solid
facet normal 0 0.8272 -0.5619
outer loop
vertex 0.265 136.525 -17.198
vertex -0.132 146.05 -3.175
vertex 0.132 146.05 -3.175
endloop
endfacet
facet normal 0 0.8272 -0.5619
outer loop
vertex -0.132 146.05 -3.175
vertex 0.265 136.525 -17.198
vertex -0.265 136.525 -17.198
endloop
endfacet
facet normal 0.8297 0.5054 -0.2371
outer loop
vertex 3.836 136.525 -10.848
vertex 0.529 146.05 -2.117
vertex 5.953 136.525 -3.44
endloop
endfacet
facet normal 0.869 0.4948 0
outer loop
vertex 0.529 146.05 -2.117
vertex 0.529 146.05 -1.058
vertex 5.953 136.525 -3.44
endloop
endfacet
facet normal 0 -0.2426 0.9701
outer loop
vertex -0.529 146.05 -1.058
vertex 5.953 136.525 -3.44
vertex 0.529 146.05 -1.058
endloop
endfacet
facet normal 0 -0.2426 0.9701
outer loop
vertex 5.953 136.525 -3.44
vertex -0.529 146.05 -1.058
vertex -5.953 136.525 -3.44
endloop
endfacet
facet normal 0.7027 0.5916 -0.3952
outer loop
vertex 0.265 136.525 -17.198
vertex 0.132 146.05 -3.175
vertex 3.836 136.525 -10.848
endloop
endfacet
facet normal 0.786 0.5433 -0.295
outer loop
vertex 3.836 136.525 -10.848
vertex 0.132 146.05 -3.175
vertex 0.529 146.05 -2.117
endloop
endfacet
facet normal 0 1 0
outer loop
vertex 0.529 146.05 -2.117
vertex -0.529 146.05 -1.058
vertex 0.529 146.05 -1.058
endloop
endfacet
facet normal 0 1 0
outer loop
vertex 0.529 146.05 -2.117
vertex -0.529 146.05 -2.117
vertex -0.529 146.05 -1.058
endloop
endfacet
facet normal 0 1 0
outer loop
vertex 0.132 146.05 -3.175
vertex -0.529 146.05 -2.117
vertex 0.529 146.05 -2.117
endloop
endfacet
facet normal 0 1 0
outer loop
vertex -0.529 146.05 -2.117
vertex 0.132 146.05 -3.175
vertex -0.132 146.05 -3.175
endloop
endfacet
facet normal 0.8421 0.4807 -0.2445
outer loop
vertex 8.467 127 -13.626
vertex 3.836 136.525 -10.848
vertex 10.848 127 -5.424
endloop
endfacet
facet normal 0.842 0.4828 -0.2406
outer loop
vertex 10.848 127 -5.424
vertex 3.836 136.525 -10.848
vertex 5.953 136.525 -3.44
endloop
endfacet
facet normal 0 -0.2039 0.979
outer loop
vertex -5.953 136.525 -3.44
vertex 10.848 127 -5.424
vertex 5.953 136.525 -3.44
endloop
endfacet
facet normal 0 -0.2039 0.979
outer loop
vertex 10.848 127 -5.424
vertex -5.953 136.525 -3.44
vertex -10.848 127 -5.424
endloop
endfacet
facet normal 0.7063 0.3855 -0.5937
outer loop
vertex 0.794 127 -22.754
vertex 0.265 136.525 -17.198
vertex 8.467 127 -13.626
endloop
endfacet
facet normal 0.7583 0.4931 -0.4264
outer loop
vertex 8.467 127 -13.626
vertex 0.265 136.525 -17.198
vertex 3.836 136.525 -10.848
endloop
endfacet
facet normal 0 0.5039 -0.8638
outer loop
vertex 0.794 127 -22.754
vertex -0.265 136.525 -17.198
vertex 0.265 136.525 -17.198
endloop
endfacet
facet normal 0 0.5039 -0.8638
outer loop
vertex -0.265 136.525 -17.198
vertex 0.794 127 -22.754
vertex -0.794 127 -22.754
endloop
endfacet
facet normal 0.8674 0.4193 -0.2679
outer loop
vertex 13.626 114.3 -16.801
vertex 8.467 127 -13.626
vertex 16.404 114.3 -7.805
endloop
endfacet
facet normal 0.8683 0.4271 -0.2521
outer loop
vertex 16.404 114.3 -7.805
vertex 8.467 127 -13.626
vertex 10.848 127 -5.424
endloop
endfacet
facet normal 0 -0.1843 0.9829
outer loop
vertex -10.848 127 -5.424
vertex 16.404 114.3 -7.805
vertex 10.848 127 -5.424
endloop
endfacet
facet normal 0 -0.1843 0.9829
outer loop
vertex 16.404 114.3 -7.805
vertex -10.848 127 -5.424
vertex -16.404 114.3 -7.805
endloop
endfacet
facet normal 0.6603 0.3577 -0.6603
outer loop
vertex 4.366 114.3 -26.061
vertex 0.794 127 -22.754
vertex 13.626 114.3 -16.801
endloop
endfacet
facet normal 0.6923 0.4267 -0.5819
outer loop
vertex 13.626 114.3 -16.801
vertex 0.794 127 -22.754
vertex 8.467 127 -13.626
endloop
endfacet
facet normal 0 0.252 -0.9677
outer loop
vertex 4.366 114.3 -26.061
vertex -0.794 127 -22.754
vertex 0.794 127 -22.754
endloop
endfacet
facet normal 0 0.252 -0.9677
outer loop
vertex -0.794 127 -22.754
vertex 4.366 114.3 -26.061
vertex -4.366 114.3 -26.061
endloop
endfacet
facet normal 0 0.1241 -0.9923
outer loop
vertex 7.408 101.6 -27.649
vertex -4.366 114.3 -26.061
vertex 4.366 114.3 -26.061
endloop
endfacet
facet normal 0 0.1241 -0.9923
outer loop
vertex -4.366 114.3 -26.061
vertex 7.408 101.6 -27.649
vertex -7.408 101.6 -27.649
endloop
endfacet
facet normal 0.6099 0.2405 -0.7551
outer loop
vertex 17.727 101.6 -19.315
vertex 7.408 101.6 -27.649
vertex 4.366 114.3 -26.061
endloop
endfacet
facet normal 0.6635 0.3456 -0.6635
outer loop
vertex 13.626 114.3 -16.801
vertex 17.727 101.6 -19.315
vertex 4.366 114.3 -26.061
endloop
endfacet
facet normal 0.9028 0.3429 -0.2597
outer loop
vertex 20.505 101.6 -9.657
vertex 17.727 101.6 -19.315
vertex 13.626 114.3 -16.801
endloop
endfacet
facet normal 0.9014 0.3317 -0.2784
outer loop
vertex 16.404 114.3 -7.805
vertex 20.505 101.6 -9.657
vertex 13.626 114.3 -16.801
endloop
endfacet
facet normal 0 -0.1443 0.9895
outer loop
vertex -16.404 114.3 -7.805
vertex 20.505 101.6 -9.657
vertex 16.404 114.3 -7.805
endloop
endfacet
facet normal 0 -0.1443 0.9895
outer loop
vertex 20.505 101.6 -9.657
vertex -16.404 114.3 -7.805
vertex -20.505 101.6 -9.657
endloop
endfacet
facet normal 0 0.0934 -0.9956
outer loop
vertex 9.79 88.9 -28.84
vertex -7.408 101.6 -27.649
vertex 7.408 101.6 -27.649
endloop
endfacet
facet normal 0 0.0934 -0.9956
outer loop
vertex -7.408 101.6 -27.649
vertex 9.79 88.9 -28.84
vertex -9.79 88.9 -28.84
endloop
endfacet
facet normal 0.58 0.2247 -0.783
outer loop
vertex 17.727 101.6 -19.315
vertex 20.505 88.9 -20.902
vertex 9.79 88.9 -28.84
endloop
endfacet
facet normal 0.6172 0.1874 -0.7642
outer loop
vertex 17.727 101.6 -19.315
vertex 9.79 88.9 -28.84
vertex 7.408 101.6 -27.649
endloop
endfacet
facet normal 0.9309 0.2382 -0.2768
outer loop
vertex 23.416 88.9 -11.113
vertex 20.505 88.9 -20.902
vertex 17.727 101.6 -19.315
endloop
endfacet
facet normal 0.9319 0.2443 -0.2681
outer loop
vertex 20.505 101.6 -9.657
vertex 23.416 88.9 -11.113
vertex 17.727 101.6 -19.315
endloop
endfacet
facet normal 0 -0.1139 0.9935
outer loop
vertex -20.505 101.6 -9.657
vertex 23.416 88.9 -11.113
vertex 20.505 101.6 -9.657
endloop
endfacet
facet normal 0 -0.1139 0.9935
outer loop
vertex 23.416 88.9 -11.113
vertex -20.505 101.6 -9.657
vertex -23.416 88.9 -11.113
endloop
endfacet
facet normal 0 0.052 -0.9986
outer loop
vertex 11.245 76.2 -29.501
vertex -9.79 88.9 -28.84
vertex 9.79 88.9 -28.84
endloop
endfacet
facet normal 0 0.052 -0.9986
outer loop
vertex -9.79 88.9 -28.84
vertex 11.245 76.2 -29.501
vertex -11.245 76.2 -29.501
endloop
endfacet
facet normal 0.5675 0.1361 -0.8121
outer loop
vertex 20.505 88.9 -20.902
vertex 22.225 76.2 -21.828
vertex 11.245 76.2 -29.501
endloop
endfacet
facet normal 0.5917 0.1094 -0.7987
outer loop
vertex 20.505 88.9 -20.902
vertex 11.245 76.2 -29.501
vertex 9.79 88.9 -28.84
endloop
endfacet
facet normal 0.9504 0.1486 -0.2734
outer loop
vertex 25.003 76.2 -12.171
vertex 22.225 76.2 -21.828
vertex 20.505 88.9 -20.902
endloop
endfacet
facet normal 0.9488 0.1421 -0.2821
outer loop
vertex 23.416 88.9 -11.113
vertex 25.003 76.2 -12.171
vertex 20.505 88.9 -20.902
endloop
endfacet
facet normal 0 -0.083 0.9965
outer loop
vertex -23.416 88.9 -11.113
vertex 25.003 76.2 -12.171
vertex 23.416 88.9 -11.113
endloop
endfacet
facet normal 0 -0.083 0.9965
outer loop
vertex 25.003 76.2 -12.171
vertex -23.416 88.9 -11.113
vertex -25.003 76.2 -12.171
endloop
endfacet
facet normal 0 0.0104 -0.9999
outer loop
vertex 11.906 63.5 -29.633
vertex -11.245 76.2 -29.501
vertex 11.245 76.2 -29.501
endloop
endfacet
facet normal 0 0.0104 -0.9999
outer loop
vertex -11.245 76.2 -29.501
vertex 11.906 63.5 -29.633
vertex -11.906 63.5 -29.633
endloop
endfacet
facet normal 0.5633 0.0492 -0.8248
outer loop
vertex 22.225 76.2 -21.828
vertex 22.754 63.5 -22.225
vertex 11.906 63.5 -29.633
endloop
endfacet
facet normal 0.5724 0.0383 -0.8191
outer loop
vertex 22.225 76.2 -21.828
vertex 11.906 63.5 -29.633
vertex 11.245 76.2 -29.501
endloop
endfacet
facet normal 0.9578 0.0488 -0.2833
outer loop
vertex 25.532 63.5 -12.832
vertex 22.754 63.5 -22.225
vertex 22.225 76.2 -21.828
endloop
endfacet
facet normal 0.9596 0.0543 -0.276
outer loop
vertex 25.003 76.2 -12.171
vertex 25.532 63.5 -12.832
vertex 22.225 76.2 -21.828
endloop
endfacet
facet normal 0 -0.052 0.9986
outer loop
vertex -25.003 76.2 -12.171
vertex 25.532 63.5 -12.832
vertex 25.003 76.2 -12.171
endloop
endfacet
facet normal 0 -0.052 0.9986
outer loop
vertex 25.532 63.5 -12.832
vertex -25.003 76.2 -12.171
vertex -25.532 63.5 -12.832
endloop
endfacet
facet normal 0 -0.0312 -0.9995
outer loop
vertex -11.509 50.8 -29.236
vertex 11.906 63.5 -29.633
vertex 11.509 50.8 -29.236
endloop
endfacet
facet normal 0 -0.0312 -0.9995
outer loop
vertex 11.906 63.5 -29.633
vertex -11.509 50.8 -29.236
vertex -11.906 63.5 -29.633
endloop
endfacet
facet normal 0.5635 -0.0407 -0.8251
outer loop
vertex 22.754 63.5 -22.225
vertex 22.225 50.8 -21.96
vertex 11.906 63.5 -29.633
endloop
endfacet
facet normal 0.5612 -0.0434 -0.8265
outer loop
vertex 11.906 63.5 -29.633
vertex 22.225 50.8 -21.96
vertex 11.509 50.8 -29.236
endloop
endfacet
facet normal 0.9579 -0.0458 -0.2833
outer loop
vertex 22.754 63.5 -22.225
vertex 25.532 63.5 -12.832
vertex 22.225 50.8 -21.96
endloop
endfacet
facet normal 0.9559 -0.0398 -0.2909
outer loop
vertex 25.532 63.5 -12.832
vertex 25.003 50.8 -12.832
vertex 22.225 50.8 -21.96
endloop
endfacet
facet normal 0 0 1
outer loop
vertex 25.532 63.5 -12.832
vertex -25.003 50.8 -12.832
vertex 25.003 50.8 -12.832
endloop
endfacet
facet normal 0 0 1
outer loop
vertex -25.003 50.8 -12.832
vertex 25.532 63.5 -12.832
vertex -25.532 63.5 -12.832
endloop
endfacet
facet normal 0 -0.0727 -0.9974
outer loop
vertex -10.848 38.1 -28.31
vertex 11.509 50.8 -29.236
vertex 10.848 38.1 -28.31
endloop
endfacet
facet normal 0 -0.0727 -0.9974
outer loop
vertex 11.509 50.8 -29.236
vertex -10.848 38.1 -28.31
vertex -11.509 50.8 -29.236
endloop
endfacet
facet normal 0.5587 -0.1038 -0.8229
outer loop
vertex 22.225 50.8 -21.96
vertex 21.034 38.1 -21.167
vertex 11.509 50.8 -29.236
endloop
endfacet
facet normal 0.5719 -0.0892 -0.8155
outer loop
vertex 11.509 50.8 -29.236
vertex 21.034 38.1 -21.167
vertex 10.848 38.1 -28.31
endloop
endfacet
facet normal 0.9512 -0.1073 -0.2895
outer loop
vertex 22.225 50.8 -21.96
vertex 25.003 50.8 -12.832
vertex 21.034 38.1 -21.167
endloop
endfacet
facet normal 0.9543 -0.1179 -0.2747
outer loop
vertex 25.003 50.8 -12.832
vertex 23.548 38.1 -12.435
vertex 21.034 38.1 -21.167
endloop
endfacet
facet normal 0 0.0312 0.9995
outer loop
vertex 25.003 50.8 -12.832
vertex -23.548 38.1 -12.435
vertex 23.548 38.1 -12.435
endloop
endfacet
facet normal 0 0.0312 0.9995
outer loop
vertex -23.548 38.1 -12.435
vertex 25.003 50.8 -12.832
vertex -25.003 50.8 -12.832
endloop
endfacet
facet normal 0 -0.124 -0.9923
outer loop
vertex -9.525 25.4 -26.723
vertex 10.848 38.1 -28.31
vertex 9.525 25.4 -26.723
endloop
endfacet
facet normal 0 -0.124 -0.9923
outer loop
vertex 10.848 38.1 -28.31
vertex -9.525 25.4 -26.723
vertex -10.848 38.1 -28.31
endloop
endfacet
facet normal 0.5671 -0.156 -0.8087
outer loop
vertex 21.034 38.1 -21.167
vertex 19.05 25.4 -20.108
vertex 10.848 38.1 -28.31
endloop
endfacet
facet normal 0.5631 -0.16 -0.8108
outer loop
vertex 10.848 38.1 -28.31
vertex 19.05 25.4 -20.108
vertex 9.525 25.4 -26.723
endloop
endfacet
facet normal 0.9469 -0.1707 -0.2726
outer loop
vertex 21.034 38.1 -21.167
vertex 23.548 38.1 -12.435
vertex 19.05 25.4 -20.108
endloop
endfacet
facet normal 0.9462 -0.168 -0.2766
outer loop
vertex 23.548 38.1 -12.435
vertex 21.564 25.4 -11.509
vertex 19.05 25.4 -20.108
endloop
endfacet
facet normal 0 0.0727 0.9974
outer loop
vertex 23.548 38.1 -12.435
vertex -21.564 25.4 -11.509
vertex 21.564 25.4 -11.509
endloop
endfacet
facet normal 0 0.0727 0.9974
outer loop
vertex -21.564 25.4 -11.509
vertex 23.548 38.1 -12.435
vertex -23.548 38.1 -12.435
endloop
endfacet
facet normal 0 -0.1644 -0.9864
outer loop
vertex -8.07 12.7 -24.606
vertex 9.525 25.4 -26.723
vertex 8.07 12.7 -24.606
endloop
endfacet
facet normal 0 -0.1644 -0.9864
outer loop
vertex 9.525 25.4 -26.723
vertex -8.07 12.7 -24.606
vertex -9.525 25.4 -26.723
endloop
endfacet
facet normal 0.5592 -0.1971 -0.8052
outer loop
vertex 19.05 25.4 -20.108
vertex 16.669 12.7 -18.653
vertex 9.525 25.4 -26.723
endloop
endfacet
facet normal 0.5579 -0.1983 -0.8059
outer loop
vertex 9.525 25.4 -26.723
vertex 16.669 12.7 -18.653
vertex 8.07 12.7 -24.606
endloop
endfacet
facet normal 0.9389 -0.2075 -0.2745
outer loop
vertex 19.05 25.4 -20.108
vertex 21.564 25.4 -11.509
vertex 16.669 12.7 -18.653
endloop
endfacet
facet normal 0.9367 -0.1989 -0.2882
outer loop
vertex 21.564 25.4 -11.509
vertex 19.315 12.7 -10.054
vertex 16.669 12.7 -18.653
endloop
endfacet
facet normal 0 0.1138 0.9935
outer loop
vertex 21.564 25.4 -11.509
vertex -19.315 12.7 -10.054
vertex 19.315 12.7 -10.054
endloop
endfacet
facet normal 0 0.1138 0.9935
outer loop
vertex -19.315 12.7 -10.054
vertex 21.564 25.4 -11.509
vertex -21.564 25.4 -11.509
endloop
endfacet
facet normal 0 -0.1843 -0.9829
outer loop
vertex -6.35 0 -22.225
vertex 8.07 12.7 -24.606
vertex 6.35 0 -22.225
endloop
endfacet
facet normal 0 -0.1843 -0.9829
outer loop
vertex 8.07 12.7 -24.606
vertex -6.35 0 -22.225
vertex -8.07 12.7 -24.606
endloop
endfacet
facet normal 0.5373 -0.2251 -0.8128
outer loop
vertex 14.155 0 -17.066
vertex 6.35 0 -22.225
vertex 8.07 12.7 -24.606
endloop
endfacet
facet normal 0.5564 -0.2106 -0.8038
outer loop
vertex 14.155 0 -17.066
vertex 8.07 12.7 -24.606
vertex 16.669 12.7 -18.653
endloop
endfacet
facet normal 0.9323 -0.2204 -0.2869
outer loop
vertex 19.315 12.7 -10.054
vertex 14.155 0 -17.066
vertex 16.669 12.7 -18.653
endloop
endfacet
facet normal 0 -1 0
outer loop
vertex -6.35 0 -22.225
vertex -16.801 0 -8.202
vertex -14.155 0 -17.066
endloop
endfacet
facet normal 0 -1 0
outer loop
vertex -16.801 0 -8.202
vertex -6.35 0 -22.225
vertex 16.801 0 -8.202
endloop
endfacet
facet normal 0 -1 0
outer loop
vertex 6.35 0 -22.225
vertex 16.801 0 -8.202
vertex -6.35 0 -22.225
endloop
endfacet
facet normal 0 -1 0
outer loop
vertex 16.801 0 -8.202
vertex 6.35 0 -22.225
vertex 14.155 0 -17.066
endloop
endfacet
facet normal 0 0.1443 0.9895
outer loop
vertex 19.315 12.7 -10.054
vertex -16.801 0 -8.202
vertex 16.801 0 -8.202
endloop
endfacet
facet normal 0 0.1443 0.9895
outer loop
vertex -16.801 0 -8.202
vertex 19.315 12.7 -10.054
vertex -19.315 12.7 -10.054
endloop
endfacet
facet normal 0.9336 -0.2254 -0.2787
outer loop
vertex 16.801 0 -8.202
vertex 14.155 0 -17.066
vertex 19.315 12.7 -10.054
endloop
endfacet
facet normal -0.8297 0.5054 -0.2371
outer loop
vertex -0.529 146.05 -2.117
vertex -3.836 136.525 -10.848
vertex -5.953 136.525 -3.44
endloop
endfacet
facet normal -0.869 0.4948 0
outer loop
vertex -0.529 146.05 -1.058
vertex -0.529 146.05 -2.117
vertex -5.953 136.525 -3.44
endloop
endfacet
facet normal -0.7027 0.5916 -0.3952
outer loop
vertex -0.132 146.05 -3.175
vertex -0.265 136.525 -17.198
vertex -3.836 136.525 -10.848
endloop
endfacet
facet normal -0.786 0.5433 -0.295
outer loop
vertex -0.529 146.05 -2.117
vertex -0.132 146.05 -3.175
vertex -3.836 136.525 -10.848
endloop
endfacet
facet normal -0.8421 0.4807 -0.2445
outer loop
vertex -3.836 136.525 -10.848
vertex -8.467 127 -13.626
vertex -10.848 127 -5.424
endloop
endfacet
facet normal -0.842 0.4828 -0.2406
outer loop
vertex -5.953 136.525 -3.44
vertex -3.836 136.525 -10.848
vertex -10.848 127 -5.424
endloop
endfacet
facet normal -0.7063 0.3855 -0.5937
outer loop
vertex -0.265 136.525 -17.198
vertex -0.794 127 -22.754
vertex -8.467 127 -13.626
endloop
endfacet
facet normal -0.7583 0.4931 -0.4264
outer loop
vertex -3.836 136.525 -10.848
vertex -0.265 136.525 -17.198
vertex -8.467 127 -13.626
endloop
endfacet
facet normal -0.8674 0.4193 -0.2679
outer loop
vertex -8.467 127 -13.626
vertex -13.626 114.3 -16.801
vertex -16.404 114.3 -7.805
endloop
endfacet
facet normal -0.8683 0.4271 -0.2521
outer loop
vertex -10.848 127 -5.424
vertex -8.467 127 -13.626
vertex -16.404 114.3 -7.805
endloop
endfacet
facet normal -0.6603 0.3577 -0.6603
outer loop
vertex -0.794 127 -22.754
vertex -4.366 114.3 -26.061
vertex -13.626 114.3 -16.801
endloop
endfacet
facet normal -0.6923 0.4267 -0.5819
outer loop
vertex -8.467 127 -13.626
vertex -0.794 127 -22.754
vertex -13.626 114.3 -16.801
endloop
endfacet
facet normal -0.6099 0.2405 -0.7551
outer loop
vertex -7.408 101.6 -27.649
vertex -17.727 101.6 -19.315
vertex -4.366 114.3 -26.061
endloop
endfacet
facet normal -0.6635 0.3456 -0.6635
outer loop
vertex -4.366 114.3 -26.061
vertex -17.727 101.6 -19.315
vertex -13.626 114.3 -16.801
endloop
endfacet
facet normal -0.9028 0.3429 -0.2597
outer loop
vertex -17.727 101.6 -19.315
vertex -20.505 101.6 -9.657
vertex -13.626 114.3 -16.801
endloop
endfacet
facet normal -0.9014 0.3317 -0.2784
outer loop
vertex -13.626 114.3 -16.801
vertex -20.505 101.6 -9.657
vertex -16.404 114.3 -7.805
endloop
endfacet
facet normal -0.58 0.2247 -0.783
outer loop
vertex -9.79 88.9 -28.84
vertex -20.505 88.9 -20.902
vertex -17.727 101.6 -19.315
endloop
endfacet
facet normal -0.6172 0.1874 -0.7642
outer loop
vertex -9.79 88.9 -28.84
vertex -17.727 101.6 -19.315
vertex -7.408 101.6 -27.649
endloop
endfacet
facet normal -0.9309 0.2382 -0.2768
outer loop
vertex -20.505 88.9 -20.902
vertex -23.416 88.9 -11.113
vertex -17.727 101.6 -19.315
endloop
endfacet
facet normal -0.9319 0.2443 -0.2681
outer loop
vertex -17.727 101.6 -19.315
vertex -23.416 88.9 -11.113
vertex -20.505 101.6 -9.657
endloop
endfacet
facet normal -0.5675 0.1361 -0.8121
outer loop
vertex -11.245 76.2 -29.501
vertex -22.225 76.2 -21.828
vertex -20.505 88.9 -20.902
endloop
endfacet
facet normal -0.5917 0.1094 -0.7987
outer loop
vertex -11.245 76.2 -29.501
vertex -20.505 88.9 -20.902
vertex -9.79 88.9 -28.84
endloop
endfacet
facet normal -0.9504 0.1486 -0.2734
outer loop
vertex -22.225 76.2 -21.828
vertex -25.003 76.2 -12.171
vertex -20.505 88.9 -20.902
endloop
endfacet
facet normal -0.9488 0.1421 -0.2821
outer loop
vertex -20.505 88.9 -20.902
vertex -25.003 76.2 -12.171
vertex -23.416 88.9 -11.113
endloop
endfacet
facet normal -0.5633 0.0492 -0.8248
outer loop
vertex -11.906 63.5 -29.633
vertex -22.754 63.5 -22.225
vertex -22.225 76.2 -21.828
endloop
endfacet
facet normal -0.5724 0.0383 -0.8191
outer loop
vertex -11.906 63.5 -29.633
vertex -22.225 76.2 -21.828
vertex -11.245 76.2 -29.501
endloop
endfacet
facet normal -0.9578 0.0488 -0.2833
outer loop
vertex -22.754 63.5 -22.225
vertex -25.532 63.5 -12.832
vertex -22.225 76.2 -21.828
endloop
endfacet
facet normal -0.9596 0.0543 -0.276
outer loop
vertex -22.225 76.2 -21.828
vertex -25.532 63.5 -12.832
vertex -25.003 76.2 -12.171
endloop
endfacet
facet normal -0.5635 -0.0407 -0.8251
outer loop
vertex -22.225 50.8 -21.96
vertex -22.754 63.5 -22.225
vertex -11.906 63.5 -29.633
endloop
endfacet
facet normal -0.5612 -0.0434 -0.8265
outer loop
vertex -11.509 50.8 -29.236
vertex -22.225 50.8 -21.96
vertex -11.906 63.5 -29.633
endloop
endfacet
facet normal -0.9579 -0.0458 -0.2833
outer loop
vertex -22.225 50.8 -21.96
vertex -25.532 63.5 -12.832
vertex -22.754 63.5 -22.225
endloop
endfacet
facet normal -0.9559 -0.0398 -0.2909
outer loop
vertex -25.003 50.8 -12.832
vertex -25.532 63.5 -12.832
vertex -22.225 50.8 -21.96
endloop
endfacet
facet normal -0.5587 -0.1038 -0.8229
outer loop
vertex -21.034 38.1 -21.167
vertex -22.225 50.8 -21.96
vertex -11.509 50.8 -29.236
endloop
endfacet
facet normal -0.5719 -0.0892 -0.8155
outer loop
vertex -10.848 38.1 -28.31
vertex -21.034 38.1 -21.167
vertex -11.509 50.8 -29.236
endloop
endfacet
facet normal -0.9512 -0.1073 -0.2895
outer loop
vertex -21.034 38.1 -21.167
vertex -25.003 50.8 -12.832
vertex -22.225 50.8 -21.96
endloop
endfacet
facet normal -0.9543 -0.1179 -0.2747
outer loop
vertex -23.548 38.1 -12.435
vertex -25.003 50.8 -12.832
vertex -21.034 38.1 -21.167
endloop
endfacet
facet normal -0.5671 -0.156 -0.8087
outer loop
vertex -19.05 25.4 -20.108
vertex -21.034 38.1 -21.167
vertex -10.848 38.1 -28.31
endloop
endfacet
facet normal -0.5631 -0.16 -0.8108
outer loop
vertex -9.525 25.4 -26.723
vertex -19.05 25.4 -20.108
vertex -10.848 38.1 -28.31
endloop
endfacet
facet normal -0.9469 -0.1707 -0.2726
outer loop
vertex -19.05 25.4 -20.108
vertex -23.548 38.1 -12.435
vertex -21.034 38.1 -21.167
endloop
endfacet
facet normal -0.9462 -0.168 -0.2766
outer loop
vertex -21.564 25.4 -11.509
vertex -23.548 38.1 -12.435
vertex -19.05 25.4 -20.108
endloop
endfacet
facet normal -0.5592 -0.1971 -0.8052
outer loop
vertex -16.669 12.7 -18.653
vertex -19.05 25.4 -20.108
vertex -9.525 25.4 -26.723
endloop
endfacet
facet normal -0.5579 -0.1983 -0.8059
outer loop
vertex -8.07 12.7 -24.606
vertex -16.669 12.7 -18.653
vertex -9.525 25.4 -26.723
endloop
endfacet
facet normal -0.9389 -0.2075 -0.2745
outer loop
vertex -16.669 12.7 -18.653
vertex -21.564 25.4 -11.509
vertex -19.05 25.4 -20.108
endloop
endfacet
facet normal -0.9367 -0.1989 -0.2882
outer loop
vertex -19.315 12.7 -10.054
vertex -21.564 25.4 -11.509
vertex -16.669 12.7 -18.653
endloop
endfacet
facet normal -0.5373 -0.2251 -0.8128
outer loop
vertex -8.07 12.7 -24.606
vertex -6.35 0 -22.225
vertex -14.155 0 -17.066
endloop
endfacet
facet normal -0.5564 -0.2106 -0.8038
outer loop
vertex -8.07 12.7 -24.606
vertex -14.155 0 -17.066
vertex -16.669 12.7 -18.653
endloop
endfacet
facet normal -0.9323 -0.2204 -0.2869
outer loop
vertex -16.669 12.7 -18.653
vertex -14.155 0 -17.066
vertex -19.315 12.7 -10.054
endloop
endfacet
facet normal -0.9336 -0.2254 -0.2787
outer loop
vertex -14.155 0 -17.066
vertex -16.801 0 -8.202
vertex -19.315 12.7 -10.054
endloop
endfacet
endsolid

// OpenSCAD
// Generated by linetab2solid.py
section12=[[0, 7.75, 0.0], [0, 21.0, 0.0], [6.0, 21.0, 0.0], [13.375, 16.125, 0.0], [15.875, 7.75, 0.0]];
section11=[[0, 9.5, 12.0], [0, 23.25, 12.0], [7.625, 23.25, 12.0], [15.75, 17.625, 12.0], [18.25, 9.5, 12.0]];
section10=[[0, 10.875, 24.0], [0, 25.25, 24.0], [9.0, 25.25, 24.0], [18.0, 19.0, 24.0], [20.375, 10.875, 24.0]];
section9=[[0, 11.75, 36.0], [0, 26.75, 36.0], [10.25, 26.75, 36.0], [19.875, 20.0, 36.0], [22.25, 11.75, 36.0]];
section8=[[0, 12.125, 48.0], [0, 27.625, 48.0], [10.875, 27.625, 48.0], [21.0, 20.75, 48.0], [23.625, 12.125, 48.0]];
section7=[[0, 12.125, 60.0], [0, 28.0, 60.0], [11.25, 28.0, 60.0], [21.5, 21.0, 60.0], [24.125, 12.125, 60.0]];
section6=[[0, 11.5, 72.0], [0, 27.875, 72.0], [10.625, 27.875, 72.0], [21.0, 20.625, 72.0], [23.625, 11.5, 72.0]];
section5=[[0, 10.5, 84.0], [0, 27.25, 84.0], [9.25, 27.25, 84.0], [19.375, 19.75, 84.0], [22.125, 10.5, 84.0]];
section4=[[0, 9.125, 96.0], [0, 26.125, 96.0], [7.0, 26.125, 96.0], [16.75, 18.25, 96.0], [19.375, 9.125, 96.0]];
section3=[[0, 7.375, 108.0], [0, 24.625, 108.0], [4.125, 24.625, 108.0], [12.875, 15.875, 108.0], [15.5, 7.375, 108.0]];
section2=[[0, 5.125, 120.0], [0, 21.5, 120.0], [0.75, 21.5, 120.0], [8.0, 12.875, 120.0], [10.25, 5.125, 120.0]];
section1=[[0, 3.25, 129.0], [0, 16.25, 129.0], [0.25, 16.25, 129.0], [3.625, 10.25, 129.0], [5.625, 3.25, 129.0]];
section0=[[0, 1.0, 138.0], [0, 3.0, 138.0], [0.125, 3.0, 138.0], [0.5, 2.0, 138.0], [0.5, 1.0, 138.0]];
bottom=[[6.0, 21.0, 0.0], [7.625, 23.25, 12.0], [9.0, 25.25, 24.0], [10.25, 26.75, 36.0], [10.875, 27.625, 48.0], [11.25, 28.0, 60.0], [10.625, 27.875, 72.0], [9.25, 27.25, 84.0], [7.0, 26.125, 96.0], [4.125, 24.625, 108.0], [0.75, 21.5, 120.0], [0.25, 16.25, 129.0], [0.125, 3.0, 138.0]];
chine=[[13.375, 16.125, 0.0], [15.75, 17.625, 12.0], [18.0, 19.0, 24.0], [19.875, 20.0, 36.0], [21.0, 20.75, 48.0], [21.5, 21.0, 60.0], [21.0, 20.625, 72.0], [19.375, 19.75, 84.0], [16.75, 18.25, 96.0], [12.875, 15.875, 108.0], [8.0, 12.875, 120.0], [3.625, 10.25, 129.0], [0.5, 2.0, 138.0]];
gunwale=[[15.875, 7.75, 0.0], [18.25, 9.5, 12.0], [20.375, 10.875, 24.0], [22.25, 11.75, 36.0], [23.625, 12.125, 48.0], [24.125, 12.125, 60.0], [23.625, 11.5, 72.0], [22.125, 10.5, 84.0], [19.375, 9.125, 96.0], [15.5, 7.375, 108.0], [10.25, 5.125, 120.0], [5.625, 3.25, 129.0], [0.5, 1.0, 138.0]];

//Scale 1/2" : 1' and convert to mm (about 6" long model)
rotate([-90,0,0]) scale(25.4 / 24) {
    half_hull();
    mirror() half_hull();
}

module half_hull () {
    stitch (section0, section1);
    stitch (section1, section2);
    stitch (section2, section3);
    stitch (section3, section4);
    stitch (section4, section5);
    stitch (section5, section6);
    stitch (section6, section7);
    stitch (section7, section8); 
    stitch (section8, section9);
    stitch (section9, section10);
    stitch (section10, section11);
    stitch (section11, section12);
}

// Stiches together two sets of 2D polygon points seperated to for a 
// polyhedron. The two sets of points are generated by extending the
// original set into 3D (by adding a 3D coordinate, Z=1) and then
// transforming them with the two matricies, m0 and m1. 
module stitch(p0, p1) {
    n = len(p0);

    //p = [ for(i=[0:n-1]) [p2d[i][0], p2d[i][1], 1] ];

    //p0 = [for(i=[0:n-1]) [dot(p[i],m0[0]), dot(p[i],m0[1]), dot(p[i],m0[2])] ];
    //p1 = [for(i=[0:n-1]) [dot(p[i],m1[0]), dot(p[i],m1[1]), dot(p[i],m1[2])] ];
    //p0 = [for(i=[0:n-1]) [dot(p[i],m0[0]), dot(p[i],m0[1]), dot(p[i],m0[2])] ];
    //p1 = [for(i=[0:n-1]) [dot(p[i],m1[0]), dot(p[i],m1[1]), dot(p[i],m1[2])] ];

    bottom = [[for(i=[0:n-1]) i]];
    top    = [[for(i=[2*n-1:-1:n]) i%(2*n)]];
    sides  = [ for (i=[0:n-1]) [(0+i)%n+n,(1+i)%n+n,(1+i)%n,(0+i)%n]];
    all_faces = concat(bottom, top, sides);

    polyhedron(concat(p0, p1), all_faces);
}
